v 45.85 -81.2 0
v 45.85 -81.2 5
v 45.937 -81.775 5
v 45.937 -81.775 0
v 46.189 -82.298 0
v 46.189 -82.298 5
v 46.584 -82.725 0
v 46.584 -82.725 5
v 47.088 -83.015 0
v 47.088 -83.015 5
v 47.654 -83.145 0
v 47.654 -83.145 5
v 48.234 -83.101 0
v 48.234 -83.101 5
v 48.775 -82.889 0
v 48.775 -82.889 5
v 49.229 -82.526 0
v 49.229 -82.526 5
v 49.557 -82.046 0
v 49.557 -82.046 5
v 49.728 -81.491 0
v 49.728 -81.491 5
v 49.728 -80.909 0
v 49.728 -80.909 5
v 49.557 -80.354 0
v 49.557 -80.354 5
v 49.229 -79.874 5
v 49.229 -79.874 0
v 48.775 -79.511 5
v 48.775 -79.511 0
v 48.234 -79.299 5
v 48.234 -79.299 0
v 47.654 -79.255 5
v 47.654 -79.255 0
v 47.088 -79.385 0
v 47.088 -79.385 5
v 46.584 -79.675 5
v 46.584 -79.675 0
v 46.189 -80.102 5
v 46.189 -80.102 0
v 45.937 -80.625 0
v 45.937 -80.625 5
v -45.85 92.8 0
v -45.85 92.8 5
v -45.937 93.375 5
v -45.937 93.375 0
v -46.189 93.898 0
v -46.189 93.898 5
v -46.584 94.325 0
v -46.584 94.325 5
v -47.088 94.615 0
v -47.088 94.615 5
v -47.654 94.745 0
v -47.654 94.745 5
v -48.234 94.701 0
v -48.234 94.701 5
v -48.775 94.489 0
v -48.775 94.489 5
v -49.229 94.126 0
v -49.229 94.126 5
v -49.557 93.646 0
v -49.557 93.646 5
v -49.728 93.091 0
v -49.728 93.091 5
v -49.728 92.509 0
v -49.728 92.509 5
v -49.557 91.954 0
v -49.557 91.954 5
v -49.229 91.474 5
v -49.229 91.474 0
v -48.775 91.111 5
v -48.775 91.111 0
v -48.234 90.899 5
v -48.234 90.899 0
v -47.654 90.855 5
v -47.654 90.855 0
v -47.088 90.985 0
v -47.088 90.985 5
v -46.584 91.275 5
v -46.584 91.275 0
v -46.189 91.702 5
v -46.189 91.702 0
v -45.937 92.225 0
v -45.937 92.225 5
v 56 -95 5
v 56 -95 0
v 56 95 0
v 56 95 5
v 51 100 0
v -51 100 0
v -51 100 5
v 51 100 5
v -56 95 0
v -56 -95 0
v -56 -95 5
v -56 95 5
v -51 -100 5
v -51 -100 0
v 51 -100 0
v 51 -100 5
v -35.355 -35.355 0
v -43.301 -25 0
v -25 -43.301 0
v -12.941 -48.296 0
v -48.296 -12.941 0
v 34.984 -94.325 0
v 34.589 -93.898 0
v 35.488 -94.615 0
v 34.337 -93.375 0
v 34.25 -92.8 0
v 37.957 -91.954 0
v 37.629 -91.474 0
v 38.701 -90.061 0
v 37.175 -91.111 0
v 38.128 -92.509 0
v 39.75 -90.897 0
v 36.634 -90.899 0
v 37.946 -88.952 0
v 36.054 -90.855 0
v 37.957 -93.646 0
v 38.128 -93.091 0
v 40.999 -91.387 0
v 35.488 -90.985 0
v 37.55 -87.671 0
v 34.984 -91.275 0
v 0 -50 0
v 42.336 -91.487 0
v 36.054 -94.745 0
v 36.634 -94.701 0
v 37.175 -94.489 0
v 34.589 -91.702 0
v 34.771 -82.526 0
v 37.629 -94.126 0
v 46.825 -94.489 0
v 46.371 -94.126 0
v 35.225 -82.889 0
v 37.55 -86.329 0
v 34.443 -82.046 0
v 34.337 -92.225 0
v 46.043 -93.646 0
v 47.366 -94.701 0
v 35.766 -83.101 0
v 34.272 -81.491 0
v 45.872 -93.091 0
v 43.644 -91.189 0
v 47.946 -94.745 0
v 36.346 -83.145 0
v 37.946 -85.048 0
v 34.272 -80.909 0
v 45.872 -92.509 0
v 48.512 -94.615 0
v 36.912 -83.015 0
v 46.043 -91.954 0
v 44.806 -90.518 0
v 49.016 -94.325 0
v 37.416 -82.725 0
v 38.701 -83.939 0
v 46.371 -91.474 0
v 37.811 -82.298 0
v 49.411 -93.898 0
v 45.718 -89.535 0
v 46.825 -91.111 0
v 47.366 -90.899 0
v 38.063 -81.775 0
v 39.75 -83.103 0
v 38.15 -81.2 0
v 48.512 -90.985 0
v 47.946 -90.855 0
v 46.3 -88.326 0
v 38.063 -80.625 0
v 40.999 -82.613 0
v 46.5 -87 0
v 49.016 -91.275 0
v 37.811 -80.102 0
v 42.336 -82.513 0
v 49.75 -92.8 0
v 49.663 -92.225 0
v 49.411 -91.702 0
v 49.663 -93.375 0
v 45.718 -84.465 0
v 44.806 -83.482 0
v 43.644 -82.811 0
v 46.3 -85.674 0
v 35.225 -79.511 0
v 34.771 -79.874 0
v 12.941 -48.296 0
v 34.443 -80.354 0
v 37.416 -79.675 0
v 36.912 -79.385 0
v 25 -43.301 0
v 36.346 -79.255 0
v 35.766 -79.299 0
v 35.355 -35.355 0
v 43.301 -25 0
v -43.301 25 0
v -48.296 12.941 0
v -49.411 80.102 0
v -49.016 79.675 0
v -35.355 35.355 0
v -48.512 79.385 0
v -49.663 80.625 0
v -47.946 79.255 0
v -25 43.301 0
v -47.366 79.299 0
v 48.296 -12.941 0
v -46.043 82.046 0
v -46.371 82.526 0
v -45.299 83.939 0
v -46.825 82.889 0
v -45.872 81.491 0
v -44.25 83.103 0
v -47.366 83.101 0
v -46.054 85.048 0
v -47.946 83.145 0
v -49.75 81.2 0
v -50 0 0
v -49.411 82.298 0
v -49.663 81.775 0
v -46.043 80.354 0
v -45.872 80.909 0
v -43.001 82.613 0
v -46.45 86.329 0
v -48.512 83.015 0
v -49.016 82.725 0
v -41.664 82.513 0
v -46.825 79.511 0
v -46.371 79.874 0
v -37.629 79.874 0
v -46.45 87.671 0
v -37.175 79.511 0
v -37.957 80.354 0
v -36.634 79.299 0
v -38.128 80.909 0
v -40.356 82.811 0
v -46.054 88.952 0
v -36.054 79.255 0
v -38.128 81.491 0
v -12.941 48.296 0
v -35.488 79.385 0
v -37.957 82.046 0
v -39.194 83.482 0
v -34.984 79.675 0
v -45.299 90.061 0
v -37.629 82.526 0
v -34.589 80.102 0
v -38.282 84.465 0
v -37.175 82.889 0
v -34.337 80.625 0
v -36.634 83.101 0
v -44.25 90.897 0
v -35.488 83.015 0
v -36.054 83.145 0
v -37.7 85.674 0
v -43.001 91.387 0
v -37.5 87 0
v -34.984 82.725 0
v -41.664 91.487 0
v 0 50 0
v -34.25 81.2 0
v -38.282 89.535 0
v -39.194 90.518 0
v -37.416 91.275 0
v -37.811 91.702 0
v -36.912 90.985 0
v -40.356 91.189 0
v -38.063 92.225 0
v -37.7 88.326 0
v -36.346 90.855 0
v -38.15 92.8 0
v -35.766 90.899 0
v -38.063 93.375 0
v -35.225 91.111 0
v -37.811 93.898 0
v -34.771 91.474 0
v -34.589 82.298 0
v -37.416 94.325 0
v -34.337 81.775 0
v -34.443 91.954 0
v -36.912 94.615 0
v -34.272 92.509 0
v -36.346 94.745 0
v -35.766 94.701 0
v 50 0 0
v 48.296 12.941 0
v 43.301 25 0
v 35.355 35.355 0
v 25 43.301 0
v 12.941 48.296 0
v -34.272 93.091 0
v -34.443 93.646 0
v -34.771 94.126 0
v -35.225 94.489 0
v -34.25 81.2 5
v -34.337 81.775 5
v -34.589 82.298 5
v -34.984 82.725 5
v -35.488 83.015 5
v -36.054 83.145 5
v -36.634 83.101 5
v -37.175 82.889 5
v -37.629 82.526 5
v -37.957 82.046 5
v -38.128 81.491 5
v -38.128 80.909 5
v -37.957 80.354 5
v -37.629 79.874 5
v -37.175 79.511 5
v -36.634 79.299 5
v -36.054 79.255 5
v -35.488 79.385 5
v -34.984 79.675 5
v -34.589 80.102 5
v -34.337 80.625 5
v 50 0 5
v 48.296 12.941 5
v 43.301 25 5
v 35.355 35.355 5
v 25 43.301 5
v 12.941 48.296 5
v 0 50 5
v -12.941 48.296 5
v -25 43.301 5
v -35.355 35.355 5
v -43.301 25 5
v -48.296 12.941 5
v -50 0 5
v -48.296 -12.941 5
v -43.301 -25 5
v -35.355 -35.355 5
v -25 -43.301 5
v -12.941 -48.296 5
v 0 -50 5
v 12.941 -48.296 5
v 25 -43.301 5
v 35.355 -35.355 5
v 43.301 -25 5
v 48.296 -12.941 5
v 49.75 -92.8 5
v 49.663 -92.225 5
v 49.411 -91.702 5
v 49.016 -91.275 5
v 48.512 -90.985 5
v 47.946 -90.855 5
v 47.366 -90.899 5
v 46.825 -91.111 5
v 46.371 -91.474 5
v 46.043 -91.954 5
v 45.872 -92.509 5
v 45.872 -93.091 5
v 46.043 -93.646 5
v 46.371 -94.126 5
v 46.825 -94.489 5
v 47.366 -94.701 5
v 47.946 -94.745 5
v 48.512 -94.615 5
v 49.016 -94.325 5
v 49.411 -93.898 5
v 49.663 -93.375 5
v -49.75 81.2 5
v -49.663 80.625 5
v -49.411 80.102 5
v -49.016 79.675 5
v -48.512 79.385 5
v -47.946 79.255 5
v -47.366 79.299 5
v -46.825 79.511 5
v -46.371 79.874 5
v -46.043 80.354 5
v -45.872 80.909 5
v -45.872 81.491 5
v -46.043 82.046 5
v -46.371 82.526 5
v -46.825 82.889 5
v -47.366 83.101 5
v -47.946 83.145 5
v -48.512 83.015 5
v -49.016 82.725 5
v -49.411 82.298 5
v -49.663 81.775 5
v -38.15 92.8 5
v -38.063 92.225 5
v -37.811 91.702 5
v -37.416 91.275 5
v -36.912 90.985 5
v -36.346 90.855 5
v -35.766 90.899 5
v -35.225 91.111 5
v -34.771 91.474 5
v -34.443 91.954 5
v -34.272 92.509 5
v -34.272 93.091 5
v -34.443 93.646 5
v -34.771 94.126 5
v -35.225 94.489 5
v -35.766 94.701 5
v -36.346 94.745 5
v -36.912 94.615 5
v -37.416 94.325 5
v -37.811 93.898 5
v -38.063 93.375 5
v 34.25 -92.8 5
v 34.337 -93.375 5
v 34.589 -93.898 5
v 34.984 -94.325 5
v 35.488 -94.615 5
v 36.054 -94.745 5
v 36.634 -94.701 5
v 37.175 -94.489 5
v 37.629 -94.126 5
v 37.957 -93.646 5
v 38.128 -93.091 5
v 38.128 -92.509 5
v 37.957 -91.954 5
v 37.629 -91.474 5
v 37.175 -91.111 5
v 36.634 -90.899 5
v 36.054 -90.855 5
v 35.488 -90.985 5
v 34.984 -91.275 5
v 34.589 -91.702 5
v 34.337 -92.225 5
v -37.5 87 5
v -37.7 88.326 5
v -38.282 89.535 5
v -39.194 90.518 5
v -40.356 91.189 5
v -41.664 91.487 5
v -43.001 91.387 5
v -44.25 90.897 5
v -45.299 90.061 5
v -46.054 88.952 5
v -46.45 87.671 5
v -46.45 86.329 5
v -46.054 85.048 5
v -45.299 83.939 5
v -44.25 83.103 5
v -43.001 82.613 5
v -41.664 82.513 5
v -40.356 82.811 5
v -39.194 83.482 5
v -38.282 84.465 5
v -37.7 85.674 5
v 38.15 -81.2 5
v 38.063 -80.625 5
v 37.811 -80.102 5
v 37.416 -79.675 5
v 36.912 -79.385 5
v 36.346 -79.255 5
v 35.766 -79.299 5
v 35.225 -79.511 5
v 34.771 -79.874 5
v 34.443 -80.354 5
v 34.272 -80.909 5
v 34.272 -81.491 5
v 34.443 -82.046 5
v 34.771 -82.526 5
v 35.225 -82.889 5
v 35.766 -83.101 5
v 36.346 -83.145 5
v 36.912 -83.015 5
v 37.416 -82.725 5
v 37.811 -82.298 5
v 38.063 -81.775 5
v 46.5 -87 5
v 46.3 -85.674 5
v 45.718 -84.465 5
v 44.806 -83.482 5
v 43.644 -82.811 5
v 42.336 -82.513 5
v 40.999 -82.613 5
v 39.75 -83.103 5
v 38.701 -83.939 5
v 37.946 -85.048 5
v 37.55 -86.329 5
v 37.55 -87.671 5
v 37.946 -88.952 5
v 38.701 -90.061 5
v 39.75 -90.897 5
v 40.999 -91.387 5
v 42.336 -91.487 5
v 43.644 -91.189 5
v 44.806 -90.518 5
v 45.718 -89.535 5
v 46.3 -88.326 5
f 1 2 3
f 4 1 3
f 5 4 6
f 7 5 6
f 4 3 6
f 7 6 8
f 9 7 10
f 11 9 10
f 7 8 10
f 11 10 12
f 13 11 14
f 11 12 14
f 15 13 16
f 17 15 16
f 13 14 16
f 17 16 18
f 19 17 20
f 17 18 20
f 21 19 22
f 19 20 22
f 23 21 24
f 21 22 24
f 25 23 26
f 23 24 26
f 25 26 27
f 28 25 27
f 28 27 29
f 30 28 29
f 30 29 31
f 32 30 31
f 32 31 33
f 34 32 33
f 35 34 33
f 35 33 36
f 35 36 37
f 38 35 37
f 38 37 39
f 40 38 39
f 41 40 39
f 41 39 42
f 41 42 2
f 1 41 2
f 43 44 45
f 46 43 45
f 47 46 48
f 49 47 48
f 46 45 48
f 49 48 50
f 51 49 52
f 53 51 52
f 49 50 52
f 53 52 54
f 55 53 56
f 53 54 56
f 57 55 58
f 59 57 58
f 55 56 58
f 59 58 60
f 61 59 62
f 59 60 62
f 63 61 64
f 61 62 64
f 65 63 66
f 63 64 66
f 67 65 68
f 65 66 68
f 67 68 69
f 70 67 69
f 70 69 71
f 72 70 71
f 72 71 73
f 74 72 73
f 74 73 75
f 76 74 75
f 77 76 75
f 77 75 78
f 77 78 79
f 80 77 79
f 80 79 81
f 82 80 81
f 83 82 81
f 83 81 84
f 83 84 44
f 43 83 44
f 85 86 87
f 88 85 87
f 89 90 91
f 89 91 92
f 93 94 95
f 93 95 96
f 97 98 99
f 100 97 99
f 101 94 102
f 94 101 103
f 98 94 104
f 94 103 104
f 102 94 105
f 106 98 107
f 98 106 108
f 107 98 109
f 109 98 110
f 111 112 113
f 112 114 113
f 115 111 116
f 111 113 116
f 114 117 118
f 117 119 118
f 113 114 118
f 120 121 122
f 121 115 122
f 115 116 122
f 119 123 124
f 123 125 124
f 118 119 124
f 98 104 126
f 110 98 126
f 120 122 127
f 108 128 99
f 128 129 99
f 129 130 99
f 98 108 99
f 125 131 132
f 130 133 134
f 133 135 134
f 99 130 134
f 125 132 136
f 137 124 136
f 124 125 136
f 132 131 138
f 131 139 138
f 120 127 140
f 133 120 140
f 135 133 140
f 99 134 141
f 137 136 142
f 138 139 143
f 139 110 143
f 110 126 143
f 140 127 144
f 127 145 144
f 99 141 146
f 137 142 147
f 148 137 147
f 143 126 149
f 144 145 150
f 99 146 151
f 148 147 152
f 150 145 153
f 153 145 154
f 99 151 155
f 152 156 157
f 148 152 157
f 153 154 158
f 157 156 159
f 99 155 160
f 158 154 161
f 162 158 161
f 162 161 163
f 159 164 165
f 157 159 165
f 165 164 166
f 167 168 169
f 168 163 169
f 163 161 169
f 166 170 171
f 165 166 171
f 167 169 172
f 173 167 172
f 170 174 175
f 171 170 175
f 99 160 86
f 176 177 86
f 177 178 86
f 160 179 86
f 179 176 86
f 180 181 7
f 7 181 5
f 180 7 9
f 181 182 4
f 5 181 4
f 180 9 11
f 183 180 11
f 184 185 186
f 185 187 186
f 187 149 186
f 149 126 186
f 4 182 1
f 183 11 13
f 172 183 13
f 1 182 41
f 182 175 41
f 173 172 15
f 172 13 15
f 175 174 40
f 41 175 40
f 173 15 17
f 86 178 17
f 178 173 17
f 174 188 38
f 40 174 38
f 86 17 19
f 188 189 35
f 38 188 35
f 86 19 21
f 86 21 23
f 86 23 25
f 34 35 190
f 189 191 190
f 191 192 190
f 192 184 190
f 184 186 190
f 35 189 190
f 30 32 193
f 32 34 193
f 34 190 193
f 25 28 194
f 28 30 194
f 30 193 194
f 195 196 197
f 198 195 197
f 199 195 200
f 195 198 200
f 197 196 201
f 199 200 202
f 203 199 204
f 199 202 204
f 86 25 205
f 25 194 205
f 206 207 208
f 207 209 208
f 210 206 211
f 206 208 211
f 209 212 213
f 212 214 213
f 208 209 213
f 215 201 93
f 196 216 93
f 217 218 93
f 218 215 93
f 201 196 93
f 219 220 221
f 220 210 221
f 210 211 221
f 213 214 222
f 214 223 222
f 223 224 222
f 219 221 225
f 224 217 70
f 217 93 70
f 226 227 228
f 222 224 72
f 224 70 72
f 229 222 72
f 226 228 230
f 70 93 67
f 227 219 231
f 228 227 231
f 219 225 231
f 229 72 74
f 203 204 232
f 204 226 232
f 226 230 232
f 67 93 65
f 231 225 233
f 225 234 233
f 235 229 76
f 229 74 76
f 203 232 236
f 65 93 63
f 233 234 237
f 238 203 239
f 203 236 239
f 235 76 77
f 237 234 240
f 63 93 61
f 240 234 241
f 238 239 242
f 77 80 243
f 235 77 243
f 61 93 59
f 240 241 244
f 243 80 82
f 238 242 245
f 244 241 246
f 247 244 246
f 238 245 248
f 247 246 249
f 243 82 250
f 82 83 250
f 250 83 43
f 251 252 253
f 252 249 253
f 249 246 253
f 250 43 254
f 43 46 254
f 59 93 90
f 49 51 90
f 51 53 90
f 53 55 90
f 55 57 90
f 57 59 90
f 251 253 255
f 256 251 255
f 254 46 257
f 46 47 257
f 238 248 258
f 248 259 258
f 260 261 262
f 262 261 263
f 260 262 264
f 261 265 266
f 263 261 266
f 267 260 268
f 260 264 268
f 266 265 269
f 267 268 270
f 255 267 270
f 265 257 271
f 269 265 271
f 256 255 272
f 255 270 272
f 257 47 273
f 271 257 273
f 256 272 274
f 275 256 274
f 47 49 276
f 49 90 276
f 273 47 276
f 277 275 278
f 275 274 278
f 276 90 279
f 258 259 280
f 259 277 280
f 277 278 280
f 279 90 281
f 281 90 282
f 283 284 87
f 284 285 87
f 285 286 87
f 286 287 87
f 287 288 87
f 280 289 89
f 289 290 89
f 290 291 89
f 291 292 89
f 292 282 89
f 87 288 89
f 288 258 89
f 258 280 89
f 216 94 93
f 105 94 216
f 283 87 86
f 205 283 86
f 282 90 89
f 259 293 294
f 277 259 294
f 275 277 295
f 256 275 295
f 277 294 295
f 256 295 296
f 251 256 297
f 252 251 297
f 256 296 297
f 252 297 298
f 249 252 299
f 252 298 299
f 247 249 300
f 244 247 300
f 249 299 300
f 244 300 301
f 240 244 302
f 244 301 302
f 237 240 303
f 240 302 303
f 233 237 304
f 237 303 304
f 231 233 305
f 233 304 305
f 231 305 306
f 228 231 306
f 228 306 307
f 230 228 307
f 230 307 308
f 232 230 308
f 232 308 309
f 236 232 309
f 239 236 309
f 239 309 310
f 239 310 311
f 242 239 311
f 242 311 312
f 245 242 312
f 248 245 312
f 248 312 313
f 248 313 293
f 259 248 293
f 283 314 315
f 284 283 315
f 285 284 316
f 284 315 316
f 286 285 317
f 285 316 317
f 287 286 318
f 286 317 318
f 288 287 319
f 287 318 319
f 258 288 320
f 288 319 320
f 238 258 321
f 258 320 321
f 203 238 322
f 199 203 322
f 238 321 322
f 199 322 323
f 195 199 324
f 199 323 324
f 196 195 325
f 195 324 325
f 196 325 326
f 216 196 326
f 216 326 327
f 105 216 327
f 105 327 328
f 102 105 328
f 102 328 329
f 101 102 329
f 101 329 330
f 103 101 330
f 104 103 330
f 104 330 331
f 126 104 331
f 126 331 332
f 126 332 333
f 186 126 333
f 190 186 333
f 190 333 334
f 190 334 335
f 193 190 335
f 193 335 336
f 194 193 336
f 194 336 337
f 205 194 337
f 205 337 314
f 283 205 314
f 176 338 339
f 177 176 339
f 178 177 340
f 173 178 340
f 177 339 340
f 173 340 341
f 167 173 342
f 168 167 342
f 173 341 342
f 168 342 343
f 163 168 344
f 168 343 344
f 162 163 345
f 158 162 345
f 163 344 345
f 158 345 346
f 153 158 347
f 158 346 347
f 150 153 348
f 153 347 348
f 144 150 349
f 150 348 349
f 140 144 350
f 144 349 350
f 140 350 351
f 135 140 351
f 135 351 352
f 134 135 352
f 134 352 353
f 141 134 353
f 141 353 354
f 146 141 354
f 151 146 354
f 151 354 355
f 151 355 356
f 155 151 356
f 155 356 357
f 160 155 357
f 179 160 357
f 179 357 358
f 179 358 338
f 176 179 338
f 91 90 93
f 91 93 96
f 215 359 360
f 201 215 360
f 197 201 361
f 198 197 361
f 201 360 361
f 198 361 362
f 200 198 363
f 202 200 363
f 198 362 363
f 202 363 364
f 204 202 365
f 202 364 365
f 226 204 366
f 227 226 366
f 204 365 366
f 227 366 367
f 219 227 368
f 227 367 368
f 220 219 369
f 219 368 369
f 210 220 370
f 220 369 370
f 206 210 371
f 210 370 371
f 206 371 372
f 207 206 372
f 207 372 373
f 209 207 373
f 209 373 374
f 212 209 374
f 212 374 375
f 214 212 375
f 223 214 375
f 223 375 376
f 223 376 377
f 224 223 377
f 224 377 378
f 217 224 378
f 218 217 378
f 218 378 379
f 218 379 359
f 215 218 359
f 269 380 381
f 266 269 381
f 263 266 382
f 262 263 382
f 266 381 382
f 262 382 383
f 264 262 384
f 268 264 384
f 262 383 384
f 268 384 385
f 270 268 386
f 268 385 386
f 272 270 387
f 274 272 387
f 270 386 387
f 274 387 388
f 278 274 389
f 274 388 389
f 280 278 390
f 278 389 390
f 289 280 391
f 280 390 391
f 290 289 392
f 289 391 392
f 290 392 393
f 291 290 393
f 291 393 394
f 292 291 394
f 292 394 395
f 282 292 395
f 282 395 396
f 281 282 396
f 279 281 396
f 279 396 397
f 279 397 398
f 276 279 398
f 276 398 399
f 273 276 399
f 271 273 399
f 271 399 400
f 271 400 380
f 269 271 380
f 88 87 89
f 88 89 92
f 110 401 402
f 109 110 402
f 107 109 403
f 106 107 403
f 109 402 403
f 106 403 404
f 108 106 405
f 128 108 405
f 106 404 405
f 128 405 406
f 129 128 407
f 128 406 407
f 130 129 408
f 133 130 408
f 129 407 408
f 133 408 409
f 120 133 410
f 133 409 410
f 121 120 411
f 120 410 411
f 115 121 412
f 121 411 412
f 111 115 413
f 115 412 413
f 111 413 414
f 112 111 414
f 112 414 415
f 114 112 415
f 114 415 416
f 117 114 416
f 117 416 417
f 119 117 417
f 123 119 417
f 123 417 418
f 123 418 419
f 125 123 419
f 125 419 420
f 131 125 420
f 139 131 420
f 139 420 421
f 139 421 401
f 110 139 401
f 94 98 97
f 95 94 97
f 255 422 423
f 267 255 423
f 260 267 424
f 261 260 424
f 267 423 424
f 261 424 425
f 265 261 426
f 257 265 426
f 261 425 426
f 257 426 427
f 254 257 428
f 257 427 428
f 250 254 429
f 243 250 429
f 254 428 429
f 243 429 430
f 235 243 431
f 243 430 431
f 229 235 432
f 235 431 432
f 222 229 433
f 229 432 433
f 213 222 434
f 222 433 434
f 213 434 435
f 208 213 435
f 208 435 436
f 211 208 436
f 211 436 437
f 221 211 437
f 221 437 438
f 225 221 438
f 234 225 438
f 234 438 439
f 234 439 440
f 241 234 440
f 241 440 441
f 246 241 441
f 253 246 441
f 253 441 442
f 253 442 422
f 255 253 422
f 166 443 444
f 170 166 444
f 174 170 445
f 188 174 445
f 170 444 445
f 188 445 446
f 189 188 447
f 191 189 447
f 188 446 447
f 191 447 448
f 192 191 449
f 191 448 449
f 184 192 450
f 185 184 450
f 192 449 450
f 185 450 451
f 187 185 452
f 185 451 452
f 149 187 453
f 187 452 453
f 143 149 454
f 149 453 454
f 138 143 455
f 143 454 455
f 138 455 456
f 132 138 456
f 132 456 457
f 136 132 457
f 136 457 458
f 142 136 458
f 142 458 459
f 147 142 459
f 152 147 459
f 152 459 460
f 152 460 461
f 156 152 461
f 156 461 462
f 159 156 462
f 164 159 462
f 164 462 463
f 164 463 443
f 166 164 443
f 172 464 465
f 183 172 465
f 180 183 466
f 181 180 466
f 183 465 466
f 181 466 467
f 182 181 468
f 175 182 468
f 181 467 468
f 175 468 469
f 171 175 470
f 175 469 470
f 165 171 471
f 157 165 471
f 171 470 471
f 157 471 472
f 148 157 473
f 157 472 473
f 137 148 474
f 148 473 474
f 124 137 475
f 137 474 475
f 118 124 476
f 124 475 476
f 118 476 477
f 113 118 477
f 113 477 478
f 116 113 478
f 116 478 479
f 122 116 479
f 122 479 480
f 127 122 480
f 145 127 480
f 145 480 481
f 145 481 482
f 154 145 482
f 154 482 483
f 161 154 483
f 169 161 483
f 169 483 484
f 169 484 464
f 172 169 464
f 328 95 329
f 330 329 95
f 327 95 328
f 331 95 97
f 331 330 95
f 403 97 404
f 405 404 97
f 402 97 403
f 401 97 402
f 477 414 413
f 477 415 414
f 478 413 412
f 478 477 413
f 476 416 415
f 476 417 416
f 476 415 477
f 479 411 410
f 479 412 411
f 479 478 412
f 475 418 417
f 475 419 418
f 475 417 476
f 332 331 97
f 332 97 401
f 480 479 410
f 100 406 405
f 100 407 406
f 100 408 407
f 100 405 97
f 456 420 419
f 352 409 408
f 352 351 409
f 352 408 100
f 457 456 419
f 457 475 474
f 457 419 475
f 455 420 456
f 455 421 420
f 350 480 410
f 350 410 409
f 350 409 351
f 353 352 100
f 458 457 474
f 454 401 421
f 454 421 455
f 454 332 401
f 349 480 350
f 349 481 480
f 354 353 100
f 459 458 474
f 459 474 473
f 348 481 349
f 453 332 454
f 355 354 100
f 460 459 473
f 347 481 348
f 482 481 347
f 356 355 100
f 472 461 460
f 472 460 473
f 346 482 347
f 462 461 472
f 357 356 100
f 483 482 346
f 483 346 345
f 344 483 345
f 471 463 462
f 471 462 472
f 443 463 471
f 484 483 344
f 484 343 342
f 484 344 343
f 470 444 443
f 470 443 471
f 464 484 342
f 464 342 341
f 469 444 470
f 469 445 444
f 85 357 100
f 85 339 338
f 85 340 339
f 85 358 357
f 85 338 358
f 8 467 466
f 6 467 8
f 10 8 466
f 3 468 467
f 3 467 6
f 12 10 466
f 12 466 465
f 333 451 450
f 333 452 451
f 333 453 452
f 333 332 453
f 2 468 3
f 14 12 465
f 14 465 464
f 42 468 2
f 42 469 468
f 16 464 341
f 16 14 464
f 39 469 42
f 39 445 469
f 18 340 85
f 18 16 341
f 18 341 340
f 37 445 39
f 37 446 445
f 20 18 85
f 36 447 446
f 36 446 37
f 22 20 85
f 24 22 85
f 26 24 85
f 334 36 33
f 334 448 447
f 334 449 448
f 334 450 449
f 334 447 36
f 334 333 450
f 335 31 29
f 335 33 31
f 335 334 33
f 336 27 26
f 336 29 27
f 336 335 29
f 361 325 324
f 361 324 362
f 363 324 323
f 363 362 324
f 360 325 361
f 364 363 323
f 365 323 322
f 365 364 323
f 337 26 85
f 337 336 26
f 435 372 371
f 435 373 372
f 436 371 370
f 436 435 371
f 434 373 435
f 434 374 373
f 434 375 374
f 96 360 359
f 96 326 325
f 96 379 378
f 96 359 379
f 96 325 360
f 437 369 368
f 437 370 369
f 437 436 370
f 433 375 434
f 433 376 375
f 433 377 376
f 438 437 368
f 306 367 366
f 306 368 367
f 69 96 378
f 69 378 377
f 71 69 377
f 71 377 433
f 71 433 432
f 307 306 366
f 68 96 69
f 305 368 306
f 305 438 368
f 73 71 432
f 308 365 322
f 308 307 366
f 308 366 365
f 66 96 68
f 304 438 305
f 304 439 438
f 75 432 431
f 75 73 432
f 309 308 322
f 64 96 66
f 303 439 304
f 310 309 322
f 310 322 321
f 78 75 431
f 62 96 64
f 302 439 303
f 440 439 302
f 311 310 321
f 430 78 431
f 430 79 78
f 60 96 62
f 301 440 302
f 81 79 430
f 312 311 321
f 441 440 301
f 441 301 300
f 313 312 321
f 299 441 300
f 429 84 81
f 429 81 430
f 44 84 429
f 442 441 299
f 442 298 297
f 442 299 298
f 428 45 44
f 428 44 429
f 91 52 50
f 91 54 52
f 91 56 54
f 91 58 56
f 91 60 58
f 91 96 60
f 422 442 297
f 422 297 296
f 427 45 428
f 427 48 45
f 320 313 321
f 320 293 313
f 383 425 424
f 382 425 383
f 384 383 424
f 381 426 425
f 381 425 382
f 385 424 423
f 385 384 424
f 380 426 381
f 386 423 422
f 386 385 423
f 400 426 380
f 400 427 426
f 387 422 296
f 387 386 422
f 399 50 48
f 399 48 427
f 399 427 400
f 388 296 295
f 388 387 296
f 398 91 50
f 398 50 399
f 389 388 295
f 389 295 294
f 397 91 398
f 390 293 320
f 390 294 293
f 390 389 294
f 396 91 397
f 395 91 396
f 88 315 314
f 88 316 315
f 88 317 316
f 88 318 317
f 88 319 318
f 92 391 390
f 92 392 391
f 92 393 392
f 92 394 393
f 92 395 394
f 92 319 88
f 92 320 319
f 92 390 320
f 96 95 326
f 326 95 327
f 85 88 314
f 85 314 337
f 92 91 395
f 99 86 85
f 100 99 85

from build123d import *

# Parameters (mm, degrees)
SKETCH1_W               = 112
SKETCH1_H               = 200
BOSS_EXTRUDE1_DEPTH     = 5
SKETCH6_R               = 4.5
SKETCH6_R_2             = 1.95
LEANDUT_HOLES_DEPTH     = 115.721401665
CHAMFER1_SIZE           = 5
SKETCH7_R               = 50
CUT_EXTRUDE3_DEPTH      = 115.721401665
DELETEFACE1_OUTLINE_R   = 1.95
DELETEFACE1_OUTLINE_R_2 = 4.5
DELETEFACE1_DEPTH       = 5


# Read off the part's stored shape, not the designer's step: DeleteFace1
with BuildPart() as part:
    # Sketch1 → Boss-Extrude1 (new body)
    with BuildSketch(Plane.XY):
        Rectangle(SKETCH1_W, SKETCH1_H)
    extrude(amount=BOSS_EXTRUDE1_DEPTH)

    # Sketch6 → Leandut_holes (cut, through all)
    with BuildSketch(Plane.XY.offset(5)):
        with Locations((-42, 87)):
            Circle(SKETCH6_R)
        with Locations((-47.8, 92.8)):
            Circle(SKETCH6_R_2)
        with Locations(Location((-47.8, 81.2, 0), (0, 0, 180))):
            Circle(SKETCH6_R_2)
        with Locations((-36.2, 81.2)):
            Circle(SKETCH6_R_2)
        with Locations(Location((-36.2, 92.8, 0), (0, 0, 180))):
            Circle(SKETCH6_R_2)
        with Locations((36.2, 92.8)):
            Circle(SKETCH6_R_2)
        with Locations(Location((36.2, 81.2, 0), (0, 0, 180))):
            Circle(SKETCH6_R_2)
        with Locations((47.8, 81.2)):
            Circle(SKETCH6_R_2)
        with Locations(Location((47.8, 92.8, 0), (0, 0, 180))):
            Circle(SKETCH6_R_2)
        with Locations(Location((42, 87, 0), (0, 0, 180))):
            Circle(SKETCH6_R)
        with Locations((42, -87)):
            Circle(SKETCH6_R)
        with Locations((47.8, -92.8)):
            Circle(SKETCH6_R_2)
        with Locations(Location((47.8, -81.2, 0), (0, 0, 180))):
            Circle(SKETCH6_R_2)
        with Locations((36.2, -81.2)):
            Circle(SKETCH6_R_2)
        with Locations(Location((36.2, -92.8, 0), (0, 0, 180))):
            Circle(SKETCH6_R_2)
        with Locations((-36.2, -92.8)):
            Circle(SKETCH6_R_2)
        with Locations(Location((-36.2, -81.2, 0), (0, 0, 180))):
            Circle(SKETCH6_R_2)
        with Locations((-47.8, -81.2)):
            Circle(SKETCH6_R_2)
        with Locations(Location((-47.8, -92.8, 0), (0, 0, 180))):
            Circle(SKETCH6_R_2)
        with Locations(Location((-42, -87, 0), (0, 0, 180))):
            Circle(SKETCH6_R)
    extrude(amount=-LEANDUT_HOLES_DEPTH, mode=Mode.SUBTRACT)

    # Chamfer1
    chamfer1_edges = [part.edges().sort_by_distance(p)[0] for p in [
        (56, -100, 2.5),
        (-56, -100, 2.5),
        (-56, 100, 2.5),
        (56, 100, 2.5),
    ]]
    chamfer(chamfer1_edges, length=CHAMFER1_SIZE)

    # Sketch7 → Cut-Extrude3 (cut, through all)
    with BuildSketch(Plane.XY.offset(5)):
        Circle(SKETCH7_R)
    extrude(amount=-CUT_EXTRUDE3_DEPTH, mode=Mode.SUBTRACT)

    # DeleteFace1 outline → DeleteFace1 (add)
    with BuildSketch(Plane.XY):
        with Locations((-47.8, -81.2)):
            Circle(DELETEFACE1_OUTLINE_R)
        with Locations((-47.8, -92.8)):
            Circle(DELETEFACE1_OUTLINE_R)
        with Locations((-42, -87)):
            Circle(DELETEFACE1_OUTLINE_R_2)
        with Locations((36.2, 92.8)):
            Circle(DELETEFACE1_OUTLINE_R)
        with Locations((36.2, 81.2)):
            Circle(DELETEFACE1_OUTLINE_R)
        with Locations((47.8, 81.2)):
            Circle(DELETEFACE1_OUTLINE_R)
        with Locations((47.8, 92.8)):
            Circle(DELETEFACE1_OUTLINE_R)
        with Locations((-36.2, -81.2)):
            Circle(DELETEFACE1_OUTLINE_R)
        with Locations((-36.2, -92.8)):
            Circle(DELETEFACE1_OUTLINE_R)
        with Locations((42, 87)):
            Circle(DELETEFACE1_OUTLINE_R_2)
    extrude(amount=DELETEFACE1_DEPTH)


solid = part.part
